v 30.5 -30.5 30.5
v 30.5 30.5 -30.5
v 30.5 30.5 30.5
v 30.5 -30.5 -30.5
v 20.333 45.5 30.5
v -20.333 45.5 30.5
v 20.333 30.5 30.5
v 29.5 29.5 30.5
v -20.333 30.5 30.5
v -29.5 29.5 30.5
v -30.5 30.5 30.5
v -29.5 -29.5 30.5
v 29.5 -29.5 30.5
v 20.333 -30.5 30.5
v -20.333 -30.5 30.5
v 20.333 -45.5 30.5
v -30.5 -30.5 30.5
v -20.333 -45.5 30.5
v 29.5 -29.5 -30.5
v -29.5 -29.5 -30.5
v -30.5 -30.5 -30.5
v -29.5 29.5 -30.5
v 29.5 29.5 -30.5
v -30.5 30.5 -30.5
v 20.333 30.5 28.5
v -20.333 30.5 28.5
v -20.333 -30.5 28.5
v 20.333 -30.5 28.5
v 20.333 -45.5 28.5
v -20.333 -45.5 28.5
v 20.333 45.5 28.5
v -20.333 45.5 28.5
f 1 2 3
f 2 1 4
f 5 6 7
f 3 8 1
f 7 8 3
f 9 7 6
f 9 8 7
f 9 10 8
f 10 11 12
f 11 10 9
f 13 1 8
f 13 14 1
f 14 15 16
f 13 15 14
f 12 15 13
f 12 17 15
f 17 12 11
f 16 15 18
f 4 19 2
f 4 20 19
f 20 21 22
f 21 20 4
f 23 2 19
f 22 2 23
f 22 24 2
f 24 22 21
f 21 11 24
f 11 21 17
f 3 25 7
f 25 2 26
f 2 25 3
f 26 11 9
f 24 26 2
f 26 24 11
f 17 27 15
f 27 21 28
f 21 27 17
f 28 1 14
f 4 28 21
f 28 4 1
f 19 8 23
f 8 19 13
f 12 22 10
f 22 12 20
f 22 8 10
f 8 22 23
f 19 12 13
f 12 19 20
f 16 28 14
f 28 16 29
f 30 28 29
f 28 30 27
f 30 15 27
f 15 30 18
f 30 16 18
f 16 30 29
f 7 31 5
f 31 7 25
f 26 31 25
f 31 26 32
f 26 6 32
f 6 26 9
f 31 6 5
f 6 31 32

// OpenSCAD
container_size_dimension=61;//[10:100]
container_size_z=61;//[13:100]
serving();
module serving(){

container_x=container_size_dimension;
container_y=container_size_dimension;
container_z= container_size_z;
handle_x=2*container_x/3;
handle_y=15;
handle_z=2;

difference(){
	cube([container_x,container_y,container_z], center=true);
	
	cube([container_x-2,container_x-2,container_z+1], center=true);
}
translate([0,-container_y/2-handle_y/2,container_z/2-1])
cube([handle_x,handle_y,handle_z], center=true);
translate([0,container_y/2+handle_y/2,container_z/2-1])
cube([handle_x,handle_y,handle_z], center=true);
}
